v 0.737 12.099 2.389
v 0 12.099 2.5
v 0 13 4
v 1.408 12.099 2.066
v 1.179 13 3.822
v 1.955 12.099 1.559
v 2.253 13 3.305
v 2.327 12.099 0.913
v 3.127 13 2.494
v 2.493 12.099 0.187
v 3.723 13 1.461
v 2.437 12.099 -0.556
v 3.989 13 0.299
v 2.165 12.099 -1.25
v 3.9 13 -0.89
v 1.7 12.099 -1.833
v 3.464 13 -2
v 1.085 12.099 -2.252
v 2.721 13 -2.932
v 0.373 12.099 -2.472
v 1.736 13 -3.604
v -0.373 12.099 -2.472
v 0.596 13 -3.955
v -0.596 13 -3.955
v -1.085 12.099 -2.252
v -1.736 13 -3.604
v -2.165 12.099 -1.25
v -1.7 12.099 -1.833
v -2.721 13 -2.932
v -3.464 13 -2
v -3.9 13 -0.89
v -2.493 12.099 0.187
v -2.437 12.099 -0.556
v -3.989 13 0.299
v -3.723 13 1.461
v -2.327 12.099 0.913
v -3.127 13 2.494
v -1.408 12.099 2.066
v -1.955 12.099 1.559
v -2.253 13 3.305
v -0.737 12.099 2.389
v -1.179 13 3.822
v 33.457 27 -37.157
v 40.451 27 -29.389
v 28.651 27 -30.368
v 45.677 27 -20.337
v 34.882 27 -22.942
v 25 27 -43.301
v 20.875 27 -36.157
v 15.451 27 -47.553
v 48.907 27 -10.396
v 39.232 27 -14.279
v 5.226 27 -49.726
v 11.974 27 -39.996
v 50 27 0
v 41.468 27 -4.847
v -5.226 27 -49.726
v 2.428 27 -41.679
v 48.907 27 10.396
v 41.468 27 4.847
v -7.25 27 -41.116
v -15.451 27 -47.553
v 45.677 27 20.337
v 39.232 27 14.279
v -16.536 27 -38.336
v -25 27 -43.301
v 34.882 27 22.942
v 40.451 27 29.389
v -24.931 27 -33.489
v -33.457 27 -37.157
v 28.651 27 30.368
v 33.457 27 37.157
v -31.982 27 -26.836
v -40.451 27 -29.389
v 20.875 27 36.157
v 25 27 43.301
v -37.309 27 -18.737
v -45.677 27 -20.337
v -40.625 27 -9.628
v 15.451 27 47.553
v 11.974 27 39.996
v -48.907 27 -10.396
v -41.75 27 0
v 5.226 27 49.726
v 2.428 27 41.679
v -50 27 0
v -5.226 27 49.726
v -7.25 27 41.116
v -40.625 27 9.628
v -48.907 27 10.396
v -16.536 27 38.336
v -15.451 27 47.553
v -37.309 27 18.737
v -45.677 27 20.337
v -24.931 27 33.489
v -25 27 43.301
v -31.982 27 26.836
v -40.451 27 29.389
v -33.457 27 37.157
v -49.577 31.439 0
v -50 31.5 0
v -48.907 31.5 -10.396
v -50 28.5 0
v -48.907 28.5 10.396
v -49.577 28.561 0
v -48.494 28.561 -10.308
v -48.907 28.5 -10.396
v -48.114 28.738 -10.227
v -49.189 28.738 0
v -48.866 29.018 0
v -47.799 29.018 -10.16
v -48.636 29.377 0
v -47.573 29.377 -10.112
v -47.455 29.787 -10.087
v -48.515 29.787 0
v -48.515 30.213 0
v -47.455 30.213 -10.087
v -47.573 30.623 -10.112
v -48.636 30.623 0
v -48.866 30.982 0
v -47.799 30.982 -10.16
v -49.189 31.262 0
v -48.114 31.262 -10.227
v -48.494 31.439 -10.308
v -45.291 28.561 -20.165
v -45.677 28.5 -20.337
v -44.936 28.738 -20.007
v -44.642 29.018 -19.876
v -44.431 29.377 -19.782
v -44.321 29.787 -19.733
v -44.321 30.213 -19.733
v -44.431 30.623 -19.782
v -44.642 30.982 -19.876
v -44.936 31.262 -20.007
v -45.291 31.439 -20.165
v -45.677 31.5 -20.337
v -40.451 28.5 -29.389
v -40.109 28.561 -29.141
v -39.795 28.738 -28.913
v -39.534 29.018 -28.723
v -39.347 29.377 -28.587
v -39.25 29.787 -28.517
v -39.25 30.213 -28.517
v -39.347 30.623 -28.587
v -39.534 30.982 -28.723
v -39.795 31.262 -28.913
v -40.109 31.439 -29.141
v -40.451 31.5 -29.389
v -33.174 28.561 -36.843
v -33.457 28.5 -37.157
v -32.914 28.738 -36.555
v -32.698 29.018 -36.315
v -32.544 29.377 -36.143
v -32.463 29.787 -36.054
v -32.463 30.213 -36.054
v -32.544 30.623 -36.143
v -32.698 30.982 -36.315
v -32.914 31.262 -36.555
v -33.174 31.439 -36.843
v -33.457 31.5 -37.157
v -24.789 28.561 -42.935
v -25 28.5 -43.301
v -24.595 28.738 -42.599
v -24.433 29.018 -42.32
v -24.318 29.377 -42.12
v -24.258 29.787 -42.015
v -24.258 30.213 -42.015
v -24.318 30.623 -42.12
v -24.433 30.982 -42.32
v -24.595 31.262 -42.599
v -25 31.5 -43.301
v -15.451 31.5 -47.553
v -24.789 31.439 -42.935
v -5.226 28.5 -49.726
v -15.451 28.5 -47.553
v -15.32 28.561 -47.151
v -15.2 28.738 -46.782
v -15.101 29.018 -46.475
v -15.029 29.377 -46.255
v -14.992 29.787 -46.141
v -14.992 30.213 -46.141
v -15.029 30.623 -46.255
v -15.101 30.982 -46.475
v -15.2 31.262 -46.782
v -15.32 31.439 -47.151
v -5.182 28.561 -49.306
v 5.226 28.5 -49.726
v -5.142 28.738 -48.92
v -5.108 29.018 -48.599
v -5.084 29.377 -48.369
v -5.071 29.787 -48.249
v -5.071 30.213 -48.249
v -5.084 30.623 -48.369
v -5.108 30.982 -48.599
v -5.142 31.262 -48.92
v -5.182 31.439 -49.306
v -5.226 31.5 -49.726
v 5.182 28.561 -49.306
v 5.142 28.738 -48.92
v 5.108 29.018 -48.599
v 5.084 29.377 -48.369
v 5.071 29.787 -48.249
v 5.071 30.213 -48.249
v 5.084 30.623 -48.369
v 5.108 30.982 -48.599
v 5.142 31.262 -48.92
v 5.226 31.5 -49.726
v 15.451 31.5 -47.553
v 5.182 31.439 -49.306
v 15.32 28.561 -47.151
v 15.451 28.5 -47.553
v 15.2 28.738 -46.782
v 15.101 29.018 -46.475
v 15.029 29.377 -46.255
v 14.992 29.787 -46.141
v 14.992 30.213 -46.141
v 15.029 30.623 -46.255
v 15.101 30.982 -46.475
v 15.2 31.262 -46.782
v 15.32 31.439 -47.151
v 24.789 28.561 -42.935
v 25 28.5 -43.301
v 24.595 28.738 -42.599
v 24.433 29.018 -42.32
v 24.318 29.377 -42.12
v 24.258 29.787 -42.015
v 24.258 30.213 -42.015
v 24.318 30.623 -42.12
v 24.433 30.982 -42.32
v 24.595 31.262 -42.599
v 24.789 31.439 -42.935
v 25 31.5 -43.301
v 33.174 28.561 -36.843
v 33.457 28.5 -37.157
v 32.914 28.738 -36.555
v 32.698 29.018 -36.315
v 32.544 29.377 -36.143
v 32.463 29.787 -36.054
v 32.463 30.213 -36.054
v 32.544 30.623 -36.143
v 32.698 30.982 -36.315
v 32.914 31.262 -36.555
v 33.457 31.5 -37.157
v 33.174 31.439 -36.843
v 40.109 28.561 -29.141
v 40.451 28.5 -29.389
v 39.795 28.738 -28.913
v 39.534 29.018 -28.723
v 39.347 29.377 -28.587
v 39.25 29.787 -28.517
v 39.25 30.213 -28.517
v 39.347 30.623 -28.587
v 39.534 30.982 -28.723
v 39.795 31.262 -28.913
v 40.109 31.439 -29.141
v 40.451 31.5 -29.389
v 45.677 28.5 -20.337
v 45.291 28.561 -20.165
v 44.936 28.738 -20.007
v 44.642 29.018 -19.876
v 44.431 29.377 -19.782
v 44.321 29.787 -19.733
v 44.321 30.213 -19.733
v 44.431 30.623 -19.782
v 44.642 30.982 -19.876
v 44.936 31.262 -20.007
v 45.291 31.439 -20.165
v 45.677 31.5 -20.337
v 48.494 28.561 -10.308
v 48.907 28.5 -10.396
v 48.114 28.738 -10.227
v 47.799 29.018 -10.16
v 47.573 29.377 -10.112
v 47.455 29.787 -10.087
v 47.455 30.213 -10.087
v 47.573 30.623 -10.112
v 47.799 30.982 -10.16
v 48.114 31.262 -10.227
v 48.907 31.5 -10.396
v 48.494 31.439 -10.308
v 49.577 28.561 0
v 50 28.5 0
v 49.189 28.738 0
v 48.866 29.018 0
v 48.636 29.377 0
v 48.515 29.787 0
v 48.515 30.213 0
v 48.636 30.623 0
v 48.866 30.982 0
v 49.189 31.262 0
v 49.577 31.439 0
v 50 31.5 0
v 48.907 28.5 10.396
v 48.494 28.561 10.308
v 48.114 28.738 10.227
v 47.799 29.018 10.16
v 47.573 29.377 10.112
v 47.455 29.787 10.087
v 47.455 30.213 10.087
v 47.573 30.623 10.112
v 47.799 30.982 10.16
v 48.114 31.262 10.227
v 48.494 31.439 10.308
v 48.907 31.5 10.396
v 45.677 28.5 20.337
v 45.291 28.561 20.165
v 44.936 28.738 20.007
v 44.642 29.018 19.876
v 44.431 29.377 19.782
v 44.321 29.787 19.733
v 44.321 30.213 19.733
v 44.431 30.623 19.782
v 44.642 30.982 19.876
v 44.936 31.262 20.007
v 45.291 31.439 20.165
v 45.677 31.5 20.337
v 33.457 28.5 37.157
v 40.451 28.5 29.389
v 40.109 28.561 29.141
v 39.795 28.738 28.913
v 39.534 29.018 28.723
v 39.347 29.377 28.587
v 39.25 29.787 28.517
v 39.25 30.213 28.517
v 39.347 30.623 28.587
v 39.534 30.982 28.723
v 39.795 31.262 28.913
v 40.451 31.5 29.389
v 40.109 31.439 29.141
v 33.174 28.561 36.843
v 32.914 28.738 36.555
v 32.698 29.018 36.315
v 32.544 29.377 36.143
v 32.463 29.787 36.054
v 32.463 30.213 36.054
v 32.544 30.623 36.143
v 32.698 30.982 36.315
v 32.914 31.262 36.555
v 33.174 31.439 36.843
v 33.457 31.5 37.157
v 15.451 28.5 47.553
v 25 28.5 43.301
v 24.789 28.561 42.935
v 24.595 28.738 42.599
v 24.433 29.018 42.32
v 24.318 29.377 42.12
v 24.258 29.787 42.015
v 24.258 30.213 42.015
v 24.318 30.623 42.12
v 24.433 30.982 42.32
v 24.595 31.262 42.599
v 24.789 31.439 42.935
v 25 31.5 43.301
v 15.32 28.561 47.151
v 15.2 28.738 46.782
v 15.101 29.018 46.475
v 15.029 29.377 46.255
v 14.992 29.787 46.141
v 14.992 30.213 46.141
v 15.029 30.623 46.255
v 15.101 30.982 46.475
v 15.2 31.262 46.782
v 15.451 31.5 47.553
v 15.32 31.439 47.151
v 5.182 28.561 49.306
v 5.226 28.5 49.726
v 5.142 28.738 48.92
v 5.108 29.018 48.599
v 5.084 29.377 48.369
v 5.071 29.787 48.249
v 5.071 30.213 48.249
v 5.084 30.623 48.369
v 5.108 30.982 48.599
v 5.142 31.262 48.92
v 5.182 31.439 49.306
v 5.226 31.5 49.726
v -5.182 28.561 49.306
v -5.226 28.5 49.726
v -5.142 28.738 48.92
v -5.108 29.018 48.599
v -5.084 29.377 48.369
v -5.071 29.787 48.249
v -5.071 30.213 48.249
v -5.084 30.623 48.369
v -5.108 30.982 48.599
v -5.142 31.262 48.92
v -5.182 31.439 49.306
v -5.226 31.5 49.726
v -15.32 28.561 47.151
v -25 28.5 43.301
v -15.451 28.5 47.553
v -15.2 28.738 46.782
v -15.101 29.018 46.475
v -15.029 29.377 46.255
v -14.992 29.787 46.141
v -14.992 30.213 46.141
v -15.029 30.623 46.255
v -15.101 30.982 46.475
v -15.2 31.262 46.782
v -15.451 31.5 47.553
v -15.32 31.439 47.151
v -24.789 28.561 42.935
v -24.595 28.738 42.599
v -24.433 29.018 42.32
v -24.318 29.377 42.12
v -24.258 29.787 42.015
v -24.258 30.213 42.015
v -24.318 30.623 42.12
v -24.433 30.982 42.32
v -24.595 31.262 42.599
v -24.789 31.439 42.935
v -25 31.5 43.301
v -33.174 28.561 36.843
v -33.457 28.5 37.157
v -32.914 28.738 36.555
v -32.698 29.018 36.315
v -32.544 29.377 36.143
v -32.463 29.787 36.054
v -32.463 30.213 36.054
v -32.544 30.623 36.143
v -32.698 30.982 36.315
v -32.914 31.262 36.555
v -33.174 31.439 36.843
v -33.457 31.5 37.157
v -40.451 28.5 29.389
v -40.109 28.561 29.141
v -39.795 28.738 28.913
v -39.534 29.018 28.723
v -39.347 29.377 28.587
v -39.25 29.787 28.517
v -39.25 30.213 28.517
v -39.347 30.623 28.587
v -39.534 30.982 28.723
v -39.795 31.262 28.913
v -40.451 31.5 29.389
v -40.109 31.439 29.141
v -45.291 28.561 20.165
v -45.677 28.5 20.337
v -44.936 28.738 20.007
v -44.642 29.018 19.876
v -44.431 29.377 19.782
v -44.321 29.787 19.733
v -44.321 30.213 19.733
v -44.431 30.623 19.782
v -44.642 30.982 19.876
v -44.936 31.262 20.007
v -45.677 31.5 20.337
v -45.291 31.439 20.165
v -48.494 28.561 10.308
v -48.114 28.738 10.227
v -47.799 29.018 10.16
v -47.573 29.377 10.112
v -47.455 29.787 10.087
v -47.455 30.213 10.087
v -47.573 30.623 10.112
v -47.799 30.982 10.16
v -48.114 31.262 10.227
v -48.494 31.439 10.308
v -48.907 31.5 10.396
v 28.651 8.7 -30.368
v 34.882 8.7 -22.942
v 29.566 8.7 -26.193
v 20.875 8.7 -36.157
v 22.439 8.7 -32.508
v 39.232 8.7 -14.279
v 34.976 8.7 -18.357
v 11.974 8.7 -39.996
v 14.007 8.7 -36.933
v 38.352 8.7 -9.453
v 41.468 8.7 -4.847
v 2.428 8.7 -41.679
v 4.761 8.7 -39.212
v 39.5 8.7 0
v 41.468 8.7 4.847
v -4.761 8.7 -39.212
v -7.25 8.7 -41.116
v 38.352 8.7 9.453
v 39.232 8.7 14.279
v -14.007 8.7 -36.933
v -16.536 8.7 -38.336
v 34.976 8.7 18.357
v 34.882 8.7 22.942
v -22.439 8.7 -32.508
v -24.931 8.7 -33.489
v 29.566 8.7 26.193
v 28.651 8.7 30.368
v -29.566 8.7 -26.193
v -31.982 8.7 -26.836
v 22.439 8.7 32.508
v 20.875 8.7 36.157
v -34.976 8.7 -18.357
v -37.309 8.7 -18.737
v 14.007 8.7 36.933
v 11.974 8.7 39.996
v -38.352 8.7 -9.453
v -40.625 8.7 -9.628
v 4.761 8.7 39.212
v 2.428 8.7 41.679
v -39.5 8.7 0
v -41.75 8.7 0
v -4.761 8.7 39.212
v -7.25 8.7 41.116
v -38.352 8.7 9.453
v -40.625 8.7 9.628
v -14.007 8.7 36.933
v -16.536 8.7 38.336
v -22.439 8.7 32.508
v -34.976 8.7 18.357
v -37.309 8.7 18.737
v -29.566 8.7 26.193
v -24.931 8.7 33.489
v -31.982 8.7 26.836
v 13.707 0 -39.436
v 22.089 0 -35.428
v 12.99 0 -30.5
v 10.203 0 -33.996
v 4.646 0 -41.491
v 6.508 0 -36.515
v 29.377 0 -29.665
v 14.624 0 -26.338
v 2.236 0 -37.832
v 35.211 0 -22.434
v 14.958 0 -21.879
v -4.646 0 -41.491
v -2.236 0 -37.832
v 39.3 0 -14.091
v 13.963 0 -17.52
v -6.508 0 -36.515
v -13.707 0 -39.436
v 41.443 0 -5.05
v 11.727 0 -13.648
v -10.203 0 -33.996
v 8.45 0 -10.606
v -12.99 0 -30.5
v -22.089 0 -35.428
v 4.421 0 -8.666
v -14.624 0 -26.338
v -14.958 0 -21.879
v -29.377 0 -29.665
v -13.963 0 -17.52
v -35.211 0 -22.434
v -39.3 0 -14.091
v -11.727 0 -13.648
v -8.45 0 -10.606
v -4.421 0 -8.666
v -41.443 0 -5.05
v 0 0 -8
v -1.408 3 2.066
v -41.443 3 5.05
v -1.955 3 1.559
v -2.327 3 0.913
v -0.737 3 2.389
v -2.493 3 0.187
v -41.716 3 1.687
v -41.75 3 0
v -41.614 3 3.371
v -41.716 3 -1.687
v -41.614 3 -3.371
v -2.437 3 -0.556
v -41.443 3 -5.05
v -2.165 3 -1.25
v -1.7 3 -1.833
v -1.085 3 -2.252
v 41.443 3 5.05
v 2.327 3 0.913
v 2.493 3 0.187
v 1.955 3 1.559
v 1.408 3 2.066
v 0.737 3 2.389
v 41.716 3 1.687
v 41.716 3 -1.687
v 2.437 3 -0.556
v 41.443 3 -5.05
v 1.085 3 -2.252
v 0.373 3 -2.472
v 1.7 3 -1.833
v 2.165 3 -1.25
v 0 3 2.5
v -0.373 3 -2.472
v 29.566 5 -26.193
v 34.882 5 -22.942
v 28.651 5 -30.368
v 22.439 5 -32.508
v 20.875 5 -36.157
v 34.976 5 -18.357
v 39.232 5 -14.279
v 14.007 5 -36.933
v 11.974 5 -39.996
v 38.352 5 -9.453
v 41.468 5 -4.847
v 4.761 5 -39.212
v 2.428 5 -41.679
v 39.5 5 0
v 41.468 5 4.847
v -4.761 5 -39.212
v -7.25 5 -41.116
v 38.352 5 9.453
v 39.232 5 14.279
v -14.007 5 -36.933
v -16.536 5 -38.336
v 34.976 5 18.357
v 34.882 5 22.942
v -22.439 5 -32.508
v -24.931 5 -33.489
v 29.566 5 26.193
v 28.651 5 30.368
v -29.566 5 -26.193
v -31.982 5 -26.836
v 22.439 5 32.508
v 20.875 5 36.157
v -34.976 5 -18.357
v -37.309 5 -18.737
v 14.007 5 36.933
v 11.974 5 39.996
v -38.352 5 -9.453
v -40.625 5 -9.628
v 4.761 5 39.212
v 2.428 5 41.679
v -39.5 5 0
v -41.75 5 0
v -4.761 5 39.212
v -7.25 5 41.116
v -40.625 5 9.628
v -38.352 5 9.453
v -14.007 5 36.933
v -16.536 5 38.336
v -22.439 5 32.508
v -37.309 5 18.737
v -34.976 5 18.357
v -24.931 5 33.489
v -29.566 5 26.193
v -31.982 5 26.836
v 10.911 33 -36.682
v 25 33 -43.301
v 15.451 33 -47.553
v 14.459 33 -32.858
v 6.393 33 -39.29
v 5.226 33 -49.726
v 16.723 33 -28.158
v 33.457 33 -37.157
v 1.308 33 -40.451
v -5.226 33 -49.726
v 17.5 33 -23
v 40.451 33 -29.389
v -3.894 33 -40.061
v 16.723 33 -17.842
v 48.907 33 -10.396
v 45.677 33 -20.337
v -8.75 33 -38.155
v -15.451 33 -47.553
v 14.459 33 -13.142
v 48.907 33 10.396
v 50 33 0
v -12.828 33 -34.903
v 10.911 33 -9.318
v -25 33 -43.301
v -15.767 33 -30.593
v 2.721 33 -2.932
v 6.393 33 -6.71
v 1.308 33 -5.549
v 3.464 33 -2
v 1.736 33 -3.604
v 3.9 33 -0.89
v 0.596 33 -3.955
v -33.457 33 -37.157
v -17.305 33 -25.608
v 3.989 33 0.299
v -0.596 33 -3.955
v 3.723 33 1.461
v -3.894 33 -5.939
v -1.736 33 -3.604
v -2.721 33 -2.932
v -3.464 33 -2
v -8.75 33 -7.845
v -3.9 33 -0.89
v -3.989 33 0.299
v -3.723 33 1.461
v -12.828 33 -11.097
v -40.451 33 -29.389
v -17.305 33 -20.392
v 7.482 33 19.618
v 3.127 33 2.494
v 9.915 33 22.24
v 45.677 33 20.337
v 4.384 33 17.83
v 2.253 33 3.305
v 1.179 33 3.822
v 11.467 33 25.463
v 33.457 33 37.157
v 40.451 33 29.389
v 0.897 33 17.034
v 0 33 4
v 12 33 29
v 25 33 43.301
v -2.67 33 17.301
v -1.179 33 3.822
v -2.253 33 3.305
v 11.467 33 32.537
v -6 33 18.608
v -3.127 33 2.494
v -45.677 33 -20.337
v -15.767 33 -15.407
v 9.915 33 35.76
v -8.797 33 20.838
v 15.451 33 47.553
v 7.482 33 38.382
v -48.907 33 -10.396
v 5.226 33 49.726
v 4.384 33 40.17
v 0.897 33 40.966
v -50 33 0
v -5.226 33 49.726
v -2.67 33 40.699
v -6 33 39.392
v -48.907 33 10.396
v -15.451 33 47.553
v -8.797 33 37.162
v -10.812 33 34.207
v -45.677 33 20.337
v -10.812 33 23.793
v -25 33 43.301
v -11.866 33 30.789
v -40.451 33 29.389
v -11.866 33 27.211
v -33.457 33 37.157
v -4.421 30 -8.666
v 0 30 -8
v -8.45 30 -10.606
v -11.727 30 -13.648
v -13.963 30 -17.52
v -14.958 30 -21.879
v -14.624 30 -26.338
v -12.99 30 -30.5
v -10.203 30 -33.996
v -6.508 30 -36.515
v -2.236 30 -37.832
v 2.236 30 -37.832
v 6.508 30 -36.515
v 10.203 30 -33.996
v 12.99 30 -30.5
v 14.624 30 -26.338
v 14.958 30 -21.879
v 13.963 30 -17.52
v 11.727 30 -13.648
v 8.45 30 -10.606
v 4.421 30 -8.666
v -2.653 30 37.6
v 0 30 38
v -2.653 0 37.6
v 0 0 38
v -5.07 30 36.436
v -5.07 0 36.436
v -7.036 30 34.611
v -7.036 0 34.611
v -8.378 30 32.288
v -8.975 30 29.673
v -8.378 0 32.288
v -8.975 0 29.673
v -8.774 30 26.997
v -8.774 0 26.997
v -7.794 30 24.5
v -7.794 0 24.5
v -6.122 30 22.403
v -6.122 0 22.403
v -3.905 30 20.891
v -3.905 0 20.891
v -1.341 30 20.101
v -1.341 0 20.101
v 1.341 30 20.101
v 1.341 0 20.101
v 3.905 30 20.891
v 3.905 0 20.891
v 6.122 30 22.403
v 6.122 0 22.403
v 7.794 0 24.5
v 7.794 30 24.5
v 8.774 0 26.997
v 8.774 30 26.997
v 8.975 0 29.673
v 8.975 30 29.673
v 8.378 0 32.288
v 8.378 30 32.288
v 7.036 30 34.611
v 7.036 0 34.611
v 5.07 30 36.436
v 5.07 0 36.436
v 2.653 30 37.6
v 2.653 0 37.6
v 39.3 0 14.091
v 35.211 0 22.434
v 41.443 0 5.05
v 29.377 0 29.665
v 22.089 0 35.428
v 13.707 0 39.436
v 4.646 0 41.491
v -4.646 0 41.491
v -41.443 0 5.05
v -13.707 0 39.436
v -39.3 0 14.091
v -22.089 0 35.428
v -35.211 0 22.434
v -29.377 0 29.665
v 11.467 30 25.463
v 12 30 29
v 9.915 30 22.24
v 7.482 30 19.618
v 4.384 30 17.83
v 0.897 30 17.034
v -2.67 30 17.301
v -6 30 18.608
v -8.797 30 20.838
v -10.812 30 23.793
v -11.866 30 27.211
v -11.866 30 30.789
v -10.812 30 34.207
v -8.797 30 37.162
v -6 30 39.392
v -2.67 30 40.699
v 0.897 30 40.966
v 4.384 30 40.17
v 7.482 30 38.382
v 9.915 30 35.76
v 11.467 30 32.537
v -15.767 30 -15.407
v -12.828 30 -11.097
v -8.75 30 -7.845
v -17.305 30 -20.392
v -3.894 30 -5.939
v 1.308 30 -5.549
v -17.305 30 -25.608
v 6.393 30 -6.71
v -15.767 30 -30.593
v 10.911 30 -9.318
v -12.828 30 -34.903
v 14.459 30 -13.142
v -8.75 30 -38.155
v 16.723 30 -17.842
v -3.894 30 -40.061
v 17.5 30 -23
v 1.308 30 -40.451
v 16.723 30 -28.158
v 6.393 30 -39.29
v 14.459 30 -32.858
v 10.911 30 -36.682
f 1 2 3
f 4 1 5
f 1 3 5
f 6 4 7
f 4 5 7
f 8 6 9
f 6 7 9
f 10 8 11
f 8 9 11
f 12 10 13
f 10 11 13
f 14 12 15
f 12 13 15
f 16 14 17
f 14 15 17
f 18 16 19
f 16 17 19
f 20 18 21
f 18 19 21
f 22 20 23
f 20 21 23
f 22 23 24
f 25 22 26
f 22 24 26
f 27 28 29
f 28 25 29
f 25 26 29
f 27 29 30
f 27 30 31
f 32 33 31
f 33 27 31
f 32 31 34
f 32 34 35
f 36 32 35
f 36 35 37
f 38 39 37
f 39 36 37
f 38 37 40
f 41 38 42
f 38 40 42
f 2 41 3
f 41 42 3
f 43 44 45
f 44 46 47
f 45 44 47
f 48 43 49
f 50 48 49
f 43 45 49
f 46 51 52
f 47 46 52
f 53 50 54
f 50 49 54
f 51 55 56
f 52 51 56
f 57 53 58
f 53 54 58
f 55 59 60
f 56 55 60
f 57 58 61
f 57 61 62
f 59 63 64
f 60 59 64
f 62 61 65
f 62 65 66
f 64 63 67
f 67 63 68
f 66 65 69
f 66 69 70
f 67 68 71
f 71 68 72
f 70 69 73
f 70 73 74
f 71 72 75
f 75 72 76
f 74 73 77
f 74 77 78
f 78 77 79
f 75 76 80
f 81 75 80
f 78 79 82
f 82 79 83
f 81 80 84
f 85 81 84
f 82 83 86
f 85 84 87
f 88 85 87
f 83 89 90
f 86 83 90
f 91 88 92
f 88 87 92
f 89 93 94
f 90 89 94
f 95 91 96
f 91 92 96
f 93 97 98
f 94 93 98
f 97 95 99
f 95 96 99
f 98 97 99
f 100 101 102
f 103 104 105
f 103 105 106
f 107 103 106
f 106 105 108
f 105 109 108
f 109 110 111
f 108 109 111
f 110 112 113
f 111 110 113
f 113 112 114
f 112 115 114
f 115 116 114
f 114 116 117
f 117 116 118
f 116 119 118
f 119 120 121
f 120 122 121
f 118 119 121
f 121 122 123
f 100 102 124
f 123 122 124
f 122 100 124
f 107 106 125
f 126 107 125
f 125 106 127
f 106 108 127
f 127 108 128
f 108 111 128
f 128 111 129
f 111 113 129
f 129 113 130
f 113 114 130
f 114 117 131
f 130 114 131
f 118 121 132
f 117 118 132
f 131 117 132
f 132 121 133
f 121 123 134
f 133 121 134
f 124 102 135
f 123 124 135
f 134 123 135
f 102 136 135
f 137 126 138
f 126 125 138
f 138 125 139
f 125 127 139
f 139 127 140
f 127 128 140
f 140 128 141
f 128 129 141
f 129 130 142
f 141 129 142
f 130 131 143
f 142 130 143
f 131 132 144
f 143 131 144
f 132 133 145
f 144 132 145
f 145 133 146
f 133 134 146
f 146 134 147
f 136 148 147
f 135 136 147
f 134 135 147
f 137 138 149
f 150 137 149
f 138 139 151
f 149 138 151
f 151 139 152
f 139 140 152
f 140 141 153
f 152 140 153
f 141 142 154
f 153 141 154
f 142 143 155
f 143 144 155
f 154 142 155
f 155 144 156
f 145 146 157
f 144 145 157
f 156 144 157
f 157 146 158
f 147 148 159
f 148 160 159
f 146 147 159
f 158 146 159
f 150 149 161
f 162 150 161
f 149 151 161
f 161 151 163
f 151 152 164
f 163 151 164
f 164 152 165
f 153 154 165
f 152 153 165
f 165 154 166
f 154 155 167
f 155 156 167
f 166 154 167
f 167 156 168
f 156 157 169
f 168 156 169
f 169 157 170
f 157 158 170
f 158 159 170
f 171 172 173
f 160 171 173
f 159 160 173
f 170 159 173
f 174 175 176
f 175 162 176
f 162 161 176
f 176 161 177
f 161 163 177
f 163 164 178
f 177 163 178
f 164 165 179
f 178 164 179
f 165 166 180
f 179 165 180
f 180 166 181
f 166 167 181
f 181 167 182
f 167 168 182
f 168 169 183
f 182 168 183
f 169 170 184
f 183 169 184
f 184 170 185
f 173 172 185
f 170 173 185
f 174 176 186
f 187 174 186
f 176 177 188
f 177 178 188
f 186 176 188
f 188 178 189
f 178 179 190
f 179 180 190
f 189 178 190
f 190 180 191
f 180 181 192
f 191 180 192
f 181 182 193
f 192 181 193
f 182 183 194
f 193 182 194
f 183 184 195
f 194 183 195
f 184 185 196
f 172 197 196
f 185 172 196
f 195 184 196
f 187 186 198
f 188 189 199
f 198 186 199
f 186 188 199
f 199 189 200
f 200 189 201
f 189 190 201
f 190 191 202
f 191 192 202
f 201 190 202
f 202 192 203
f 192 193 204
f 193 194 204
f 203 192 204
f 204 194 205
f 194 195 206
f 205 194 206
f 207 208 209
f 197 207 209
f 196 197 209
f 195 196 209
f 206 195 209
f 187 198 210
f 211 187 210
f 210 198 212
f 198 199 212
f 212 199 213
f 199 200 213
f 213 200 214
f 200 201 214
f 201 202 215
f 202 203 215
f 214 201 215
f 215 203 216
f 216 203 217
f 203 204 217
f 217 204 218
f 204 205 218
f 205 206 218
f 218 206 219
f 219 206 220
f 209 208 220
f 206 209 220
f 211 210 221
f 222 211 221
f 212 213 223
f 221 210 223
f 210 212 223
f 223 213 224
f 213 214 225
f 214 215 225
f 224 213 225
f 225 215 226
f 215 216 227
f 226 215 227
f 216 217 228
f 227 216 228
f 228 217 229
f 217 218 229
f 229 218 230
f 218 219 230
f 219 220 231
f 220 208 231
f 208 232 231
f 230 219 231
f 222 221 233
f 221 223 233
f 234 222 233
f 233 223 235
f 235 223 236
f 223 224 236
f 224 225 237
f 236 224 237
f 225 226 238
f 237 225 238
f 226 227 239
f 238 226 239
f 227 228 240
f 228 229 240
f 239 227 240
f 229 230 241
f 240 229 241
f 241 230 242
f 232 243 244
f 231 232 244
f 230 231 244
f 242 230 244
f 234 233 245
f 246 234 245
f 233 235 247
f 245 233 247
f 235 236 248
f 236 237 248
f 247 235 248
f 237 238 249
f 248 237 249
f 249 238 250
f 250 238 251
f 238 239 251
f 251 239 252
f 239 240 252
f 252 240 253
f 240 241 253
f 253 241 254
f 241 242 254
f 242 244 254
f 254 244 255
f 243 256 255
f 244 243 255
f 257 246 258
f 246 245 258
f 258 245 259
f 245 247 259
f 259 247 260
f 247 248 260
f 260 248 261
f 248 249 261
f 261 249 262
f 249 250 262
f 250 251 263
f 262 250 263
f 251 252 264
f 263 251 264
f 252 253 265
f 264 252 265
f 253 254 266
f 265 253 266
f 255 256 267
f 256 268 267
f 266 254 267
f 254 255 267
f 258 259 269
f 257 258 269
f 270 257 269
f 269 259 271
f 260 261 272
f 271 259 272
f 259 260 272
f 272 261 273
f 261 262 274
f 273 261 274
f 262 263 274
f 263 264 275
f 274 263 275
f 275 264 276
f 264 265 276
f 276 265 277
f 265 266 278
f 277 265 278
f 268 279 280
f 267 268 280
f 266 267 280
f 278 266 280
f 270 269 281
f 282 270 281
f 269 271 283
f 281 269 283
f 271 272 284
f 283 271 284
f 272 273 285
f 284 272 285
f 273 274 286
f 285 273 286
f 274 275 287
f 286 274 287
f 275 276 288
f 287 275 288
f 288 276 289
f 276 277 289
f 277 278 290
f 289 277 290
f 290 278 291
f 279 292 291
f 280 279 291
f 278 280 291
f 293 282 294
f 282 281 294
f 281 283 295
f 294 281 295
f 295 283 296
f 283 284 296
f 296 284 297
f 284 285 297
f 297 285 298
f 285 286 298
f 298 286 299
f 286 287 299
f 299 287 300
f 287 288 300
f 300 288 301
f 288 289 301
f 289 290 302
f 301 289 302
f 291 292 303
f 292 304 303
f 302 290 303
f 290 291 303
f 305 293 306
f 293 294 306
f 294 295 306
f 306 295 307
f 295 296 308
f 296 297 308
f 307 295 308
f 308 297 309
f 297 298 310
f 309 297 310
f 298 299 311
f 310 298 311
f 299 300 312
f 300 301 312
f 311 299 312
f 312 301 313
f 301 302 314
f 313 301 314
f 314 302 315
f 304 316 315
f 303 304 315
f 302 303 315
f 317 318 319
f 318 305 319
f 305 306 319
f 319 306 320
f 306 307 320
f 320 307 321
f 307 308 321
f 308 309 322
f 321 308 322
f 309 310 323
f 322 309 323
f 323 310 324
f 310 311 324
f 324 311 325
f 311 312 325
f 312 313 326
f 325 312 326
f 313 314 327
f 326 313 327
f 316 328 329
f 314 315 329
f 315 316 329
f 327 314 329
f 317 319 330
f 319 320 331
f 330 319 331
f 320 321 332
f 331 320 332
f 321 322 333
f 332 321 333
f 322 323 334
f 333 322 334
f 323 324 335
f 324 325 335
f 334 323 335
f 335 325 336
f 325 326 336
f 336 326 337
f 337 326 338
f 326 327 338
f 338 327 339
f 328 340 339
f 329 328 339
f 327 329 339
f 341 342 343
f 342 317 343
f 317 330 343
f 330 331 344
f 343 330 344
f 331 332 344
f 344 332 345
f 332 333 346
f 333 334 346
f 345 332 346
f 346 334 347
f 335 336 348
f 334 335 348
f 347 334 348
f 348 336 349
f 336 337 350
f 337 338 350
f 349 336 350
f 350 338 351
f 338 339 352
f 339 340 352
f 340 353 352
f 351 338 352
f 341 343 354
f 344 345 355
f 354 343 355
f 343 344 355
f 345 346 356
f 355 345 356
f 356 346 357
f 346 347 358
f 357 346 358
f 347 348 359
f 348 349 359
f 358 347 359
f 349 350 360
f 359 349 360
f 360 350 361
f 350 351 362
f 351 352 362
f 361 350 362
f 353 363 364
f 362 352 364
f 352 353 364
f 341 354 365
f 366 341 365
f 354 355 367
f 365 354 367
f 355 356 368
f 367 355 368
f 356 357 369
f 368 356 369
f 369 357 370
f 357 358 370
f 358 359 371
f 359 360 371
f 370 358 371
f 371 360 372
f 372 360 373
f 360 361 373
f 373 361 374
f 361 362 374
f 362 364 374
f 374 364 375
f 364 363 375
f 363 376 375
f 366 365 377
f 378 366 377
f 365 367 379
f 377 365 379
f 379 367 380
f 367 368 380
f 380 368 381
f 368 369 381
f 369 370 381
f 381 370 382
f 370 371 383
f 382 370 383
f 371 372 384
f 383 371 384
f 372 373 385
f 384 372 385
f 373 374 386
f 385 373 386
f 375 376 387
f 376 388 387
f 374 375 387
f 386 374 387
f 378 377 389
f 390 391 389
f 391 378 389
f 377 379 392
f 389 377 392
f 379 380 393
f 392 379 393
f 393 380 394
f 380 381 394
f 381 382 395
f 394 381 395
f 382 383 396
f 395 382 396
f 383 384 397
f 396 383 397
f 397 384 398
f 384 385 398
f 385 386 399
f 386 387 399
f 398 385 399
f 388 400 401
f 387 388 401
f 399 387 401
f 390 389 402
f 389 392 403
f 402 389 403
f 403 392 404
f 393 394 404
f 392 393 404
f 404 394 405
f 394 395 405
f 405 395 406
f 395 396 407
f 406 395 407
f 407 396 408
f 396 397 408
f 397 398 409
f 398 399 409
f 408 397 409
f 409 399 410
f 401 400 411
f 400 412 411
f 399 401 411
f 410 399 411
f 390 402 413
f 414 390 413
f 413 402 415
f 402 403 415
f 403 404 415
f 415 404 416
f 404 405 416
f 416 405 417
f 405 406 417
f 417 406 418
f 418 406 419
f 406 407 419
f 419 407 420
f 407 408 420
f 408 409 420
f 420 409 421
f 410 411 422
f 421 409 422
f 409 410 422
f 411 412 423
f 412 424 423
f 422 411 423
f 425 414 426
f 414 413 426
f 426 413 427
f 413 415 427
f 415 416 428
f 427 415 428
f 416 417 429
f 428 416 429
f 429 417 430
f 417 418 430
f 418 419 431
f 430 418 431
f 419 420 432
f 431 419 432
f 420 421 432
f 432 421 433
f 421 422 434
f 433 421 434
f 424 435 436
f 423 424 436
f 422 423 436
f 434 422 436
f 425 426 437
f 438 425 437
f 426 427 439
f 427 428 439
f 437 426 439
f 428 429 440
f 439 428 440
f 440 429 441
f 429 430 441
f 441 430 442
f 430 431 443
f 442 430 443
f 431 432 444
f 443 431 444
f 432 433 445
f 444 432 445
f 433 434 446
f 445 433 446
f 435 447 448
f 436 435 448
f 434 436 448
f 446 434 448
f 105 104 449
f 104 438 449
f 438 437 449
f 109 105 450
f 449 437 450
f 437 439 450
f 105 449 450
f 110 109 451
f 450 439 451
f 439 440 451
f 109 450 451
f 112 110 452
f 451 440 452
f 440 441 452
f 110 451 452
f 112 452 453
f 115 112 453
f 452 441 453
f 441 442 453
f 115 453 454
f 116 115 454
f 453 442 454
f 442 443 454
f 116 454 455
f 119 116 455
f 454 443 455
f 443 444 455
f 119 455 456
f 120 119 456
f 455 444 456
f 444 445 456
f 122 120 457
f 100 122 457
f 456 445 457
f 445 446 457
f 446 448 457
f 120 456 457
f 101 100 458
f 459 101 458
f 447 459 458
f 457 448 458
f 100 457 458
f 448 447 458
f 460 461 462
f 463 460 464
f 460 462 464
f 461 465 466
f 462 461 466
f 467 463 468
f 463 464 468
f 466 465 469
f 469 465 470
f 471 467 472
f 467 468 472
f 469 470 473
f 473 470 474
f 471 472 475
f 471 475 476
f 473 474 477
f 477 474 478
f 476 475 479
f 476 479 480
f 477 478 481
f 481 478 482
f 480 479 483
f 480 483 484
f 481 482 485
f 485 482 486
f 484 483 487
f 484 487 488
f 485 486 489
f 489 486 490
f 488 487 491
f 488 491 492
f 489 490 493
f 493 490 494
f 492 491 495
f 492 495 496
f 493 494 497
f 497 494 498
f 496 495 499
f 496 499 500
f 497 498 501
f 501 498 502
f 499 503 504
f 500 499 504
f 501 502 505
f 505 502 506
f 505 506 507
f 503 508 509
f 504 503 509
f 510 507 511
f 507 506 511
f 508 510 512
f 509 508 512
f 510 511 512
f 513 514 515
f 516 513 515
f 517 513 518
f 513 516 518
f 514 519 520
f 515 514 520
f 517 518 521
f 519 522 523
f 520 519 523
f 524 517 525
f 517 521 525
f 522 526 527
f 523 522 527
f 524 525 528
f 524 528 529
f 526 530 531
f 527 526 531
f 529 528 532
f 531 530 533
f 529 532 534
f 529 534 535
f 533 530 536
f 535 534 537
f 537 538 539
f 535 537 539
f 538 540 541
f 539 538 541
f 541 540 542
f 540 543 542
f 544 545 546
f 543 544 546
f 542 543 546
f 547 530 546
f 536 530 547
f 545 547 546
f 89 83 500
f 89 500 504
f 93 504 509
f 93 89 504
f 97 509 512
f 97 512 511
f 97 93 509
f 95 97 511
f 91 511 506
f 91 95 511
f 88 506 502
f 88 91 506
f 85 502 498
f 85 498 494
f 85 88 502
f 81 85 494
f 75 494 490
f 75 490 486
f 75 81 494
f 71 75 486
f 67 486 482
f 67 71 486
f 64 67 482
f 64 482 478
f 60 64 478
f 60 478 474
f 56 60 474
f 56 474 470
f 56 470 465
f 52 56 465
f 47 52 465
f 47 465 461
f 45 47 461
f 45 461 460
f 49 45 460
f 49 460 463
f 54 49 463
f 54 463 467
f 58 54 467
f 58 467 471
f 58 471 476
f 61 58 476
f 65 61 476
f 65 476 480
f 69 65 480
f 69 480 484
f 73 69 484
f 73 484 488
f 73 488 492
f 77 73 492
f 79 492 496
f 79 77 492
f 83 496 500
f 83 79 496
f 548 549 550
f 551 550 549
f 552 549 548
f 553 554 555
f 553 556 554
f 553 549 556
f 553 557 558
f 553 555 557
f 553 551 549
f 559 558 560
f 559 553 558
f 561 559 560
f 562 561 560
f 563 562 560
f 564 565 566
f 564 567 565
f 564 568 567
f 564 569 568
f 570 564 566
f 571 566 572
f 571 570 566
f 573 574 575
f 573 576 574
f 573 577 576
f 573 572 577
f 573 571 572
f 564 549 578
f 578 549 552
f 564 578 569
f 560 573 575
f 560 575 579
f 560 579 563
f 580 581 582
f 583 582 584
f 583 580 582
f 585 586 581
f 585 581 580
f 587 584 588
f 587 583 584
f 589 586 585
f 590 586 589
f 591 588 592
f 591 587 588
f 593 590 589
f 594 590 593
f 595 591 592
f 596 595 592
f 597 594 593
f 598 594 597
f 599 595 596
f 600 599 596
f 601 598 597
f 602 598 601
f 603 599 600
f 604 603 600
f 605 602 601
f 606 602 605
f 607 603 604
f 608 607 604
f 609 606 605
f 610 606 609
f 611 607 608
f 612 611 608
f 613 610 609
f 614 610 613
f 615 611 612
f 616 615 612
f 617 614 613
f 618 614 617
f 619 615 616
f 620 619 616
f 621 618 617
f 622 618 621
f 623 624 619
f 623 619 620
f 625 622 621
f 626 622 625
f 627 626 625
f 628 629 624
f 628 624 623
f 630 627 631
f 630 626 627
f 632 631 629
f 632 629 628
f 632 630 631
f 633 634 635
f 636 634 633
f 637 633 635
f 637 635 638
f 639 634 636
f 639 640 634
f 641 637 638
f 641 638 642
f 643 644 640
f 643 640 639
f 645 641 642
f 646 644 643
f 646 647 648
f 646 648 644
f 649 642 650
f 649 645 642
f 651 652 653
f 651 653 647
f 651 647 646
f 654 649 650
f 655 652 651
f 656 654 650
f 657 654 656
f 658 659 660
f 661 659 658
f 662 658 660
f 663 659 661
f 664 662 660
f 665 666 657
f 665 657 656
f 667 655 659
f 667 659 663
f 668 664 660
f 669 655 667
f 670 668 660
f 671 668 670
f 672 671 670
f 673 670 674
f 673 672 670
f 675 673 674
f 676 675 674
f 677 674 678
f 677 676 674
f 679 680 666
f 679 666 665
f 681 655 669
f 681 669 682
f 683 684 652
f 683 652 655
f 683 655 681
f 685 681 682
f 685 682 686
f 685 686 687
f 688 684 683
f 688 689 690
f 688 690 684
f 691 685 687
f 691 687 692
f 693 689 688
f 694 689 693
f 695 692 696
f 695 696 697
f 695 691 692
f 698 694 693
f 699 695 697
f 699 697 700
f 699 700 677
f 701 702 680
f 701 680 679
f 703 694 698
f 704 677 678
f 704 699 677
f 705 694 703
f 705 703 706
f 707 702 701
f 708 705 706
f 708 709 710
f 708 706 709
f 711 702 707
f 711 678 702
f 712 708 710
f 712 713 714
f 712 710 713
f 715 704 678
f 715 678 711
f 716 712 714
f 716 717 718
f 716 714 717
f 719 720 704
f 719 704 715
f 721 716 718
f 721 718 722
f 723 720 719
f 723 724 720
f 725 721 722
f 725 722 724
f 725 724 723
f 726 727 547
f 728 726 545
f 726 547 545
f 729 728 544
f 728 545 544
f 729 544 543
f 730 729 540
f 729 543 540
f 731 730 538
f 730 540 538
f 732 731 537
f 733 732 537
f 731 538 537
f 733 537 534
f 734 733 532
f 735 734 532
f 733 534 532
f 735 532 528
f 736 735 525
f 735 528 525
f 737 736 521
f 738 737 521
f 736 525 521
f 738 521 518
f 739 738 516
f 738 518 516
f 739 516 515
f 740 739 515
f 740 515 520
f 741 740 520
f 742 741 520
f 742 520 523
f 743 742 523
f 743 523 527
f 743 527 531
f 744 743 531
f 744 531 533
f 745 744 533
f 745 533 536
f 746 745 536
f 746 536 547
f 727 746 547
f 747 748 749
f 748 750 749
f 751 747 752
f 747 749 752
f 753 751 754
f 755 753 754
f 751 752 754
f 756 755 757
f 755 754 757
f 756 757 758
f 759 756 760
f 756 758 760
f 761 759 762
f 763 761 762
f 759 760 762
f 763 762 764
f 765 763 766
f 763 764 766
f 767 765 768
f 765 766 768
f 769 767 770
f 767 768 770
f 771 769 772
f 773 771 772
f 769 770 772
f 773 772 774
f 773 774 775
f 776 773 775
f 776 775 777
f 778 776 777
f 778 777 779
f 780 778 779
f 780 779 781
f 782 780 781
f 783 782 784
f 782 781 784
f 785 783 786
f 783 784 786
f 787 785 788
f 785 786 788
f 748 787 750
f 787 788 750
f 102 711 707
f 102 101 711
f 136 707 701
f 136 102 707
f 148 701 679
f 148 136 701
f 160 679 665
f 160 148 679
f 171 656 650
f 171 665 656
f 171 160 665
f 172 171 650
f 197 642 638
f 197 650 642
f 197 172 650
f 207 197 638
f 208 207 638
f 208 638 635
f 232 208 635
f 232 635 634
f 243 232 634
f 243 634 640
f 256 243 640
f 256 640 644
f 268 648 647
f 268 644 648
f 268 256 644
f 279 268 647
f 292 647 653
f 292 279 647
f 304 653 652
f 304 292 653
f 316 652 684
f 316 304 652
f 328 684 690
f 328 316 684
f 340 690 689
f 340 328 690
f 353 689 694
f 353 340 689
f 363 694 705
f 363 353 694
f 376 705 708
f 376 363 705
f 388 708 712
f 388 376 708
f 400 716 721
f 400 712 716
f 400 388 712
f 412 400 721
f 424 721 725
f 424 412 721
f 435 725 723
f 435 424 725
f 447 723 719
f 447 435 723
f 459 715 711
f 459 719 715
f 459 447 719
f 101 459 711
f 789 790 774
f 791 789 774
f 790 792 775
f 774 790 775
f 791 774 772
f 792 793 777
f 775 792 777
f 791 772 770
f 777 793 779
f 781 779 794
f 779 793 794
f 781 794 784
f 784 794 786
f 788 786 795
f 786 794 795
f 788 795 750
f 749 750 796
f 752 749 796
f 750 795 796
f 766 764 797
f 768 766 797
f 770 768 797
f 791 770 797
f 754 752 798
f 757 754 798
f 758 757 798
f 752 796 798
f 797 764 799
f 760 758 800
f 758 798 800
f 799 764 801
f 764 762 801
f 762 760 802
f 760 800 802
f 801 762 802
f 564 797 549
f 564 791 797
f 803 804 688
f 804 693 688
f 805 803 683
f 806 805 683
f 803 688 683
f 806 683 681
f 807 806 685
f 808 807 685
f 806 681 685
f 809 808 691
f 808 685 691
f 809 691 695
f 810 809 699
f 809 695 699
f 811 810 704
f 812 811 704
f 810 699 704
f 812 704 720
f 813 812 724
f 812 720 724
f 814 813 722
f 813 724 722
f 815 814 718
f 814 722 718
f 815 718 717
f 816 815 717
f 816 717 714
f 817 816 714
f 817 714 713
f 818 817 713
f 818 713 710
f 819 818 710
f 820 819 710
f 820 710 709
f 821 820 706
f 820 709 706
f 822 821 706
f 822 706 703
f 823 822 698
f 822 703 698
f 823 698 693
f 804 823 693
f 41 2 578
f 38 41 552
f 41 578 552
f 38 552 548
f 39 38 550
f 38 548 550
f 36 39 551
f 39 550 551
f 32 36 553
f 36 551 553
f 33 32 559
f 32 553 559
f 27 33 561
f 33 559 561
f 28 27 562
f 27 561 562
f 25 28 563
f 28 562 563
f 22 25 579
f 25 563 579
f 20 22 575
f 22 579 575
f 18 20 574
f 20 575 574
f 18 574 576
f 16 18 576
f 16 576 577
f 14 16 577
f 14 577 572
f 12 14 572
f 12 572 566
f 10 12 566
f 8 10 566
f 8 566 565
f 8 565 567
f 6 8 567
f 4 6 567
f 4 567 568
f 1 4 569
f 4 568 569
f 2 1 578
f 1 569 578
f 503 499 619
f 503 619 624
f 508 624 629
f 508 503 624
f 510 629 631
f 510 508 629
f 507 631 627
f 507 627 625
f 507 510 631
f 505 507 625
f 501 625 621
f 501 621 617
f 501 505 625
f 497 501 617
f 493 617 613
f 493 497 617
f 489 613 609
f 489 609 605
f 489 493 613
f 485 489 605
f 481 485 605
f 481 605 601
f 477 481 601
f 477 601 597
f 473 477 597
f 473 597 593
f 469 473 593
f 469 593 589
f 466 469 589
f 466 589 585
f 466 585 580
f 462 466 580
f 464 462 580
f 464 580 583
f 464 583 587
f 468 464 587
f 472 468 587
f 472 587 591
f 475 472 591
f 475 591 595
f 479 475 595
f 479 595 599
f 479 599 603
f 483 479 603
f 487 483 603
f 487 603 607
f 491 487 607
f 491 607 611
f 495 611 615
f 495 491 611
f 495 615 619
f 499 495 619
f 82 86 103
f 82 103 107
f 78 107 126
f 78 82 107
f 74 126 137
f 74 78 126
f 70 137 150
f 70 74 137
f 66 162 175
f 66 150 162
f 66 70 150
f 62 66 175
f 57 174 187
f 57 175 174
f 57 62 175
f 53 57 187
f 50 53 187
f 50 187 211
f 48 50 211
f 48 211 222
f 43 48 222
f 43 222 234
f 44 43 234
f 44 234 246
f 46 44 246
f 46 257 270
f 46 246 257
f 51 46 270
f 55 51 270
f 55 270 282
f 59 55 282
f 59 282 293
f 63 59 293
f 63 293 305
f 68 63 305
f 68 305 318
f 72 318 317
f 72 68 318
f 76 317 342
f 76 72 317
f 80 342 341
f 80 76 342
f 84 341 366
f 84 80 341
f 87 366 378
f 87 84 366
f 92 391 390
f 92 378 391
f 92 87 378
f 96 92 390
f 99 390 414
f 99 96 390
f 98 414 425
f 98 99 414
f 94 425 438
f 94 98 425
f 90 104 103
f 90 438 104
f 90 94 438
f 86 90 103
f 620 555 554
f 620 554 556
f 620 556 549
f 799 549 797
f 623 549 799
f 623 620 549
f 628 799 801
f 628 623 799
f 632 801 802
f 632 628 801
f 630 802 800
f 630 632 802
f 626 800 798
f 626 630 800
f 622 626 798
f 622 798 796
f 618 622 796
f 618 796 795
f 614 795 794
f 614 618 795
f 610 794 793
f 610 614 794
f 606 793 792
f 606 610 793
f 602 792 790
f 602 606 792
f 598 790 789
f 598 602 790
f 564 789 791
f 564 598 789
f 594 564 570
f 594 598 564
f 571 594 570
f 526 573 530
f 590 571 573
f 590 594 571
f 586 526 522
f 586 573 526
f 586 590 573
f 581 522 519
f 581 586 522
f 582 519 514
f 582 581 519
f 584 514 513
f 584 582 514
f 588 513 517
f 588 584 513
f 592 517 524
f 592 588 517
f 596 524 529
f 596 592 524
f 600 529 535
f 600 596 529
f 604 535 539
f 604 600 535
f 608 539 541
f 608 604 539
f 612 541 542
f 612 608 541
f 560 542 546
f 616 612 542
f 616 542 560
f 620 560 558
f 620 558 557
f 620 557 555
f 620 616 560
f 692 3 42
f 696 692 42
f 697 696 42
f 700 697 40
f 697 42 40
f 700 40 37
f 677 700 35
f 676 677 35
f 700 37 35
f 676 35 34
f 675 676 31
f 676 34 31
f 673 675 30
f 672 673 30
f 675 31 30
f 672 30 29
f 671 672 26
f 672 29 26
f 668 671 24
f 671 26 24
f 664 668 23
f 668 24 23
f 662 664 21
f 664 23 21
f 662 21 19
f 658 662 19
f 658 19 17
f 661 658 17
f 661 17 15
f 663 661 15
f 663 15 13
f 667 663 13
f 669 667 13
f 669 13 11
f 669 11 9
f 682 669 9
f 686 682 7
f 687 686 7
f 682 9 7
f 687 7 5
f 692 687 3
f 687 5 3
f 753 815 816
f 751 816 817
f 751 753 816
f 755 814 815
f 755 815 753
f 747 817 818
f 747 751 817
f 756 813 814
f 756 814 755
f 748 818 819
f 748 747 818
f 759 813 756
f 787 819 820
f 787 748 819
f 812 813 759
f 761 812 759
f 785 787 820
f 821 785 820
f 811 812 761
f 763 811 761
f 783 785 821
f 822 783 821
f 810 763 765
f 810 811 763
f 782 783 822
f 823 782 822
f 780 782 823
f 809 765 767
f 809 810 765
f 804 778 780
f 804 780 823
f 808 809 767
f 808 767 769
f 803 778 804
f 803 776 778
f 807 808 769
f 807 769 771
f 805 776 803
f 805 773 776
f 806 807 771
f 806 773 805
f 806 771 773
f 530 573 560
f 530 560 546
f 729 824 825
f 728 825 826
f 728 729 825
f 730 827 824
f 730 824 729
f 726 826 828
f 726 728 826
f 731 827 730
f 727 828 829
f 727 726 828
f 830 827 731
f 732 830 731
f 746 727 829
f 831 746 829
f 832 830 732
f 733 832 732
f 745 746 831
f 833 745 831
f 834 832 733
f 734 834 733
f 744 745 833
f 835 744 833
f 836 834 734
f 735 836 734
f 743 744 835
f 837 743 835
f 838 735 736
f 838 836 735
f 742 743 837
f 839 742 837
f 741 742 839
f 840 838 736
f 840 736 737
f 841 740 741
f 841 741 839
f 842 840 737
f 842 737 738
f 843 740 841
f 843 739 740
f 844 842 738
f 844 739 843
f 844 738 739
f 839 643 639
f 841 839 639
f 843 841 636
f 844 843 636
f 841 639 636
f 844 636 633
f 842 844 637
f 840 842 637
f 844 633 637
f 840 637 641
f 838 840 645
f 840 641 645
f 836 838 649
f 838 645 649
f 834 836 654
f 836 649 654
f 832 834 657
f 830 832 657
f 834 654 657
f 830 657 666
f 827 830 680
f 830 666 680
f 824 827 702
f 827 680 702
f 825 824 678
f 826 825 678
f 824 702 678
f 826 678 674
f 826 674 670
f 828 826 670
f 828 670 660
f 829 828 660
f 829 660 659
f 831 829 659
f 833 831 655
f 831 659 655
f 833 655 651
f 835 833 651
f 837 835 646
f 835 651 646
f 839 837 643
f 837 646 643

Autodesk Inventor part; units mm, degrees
ref_plane "YZ Plane" through (0, 0, 0) normal (1, 0, 0) x (0, 1, 0)
ref_plane "XZ Plane" through (0, 0, 0) normal (0, 1, 0) x (-1, 0, 0)
ref_plane "XY Plane" through (0, 0, 0) normal (0, 0, 1) x (1, 0, 0)
sketch "Sketch1" plane through (0, 0, 0) normal (0, 0, 1) x (1, 0, 0)
  line L0 (0, 0) -> (0, 33)
  line L1 (0, 33) -> (-50, 33)
  line L2 (0, 0) -> (-41.75, 0)
  line L3 (-41.75, 0) -> (-41.75, 5)
  line L4 (-41.75, 5) -> (-39.5, 5)
  line L5 (-39.5, 5) -> (-39.5, 8.7)
  line L6 (-39.5, 8.7) -> (-41.75, 8.7)
  line L7 (-41.75, 8.7) -> (-26.5, 8.7) construction
  line L8 (-41.75, 8.7) -> (-41.75, 27)
  line L9 (-41.75, 27) -> (-50, 27)
  arc A0 (-50, 28.5) -> (-50, 31.5) centre (-50, 30) ccw
  line L10 (-50, 33) -> (-50, 31.5)
  line L11 (-50, 28.5) -> (-50, 27)
  point P0 (-50, 32.25)
  dimension "d0" = 33
  dimension "d1" = 50
  dimension "d2" = 6
  dimension "d3" = 41.75
  dimension "d4" = 5
  dimension "d5" = 3.7
  dimension "d9" = 39.5
  dimension "d65" = 3
  dimension "d66" = 1.5
  dimension "d67" = 8.25
revolve "Revolution1" add sketch "Sketch1" angle 360 about axis through (0, 0, 0) along (0, 1, 0)
sketch "Sketch3" plane through (0, 33, 0) normal (0, 1, 0) x (1, 0, 0)
  circle A0 centre (0, 0) radius 41
  circle A1 centre (0, 23) radius 16.5 construction
  dimension "d17" = 33
  dimension "d25" = 23
hole "Hole1" at (0, 33, -23) direction (0, -1, 0) diameter 30 end through all
sketch "Sketch4" plane through (0, 33, 0) normal (0, 1, 0) x (1, 0, 0)
  circle A0 centre (0, 0) radius 39.5 projected
  point P0 (0, -29)
  dimension "d27" = 29
hole "Hole2" at (0, 33, 29) direction (0, -1, 0) diameter 18 end through all
sketch "Sketch5" plane through (0, 0, 0) normal (1, 0, 0) x (0, 1, 0)
  line L0 (0, 0) -> (0, 5.05)
  line L1 (0, -41.75) -> (0, 41.75) projected
  line L2 (0, 5.05) -> (3, 5.05)
  line L3 (3, 5.05) -> (3, -5.05)
  line L4 (3, -5.05) -> (0, -5.05)
  line L5 (0, -5.05) -> (0, 0)
  dimension "d35" = 5.05
  dimension "d36" = 3
  dimension "d37" = 10.1
extrude "Extrusion2" cut sketch "Sketch5" against normal through all both and the other way through all
sketch "Sketch6" plane through (0, 33, 0) normal (0, 1, 0) x (1, 0, 0)
  circle A0 centre (0, 23) radius 15 projected
  point P0 (0, 0)
  point P1 (0, 0)
hole "Hole3" at (0, 33, 0) direction (0, -1, 0) diameter 5 end through all
hole "Hole4" at (0, 33, 0) direction (0, -1, 0) diameter 8 depth 20 tip angle 118
sketch "Sketch7" plane through (0, 33, 0) normal (0, 1, 0) x (1, 0, 0)
  circle A0 centre (0, -29) radius 9 projected
  circle A1 centre (0, -29) radius 12
  circle A2 centre (0, 23) radius 15 projected
  circle A3 centre (0, 23) radius 17.5
  point P0 (0, 0)
  dimension "d57" = 24
  dimension "d58" = 35
extrude "Extrusion3" cut sketch "Sketch7" against normal blind 3 contours A0 | A1 | A2 | A3
thread "Thread1" size "M20x2" class "6H" standard "ANSI Metric M Profile" length 9
thread "Thread2" size "M33x3" class "6H" standard "ANSI Metric M Profile" length 12
properties part number "Body glass top" material "Polypropylene"
